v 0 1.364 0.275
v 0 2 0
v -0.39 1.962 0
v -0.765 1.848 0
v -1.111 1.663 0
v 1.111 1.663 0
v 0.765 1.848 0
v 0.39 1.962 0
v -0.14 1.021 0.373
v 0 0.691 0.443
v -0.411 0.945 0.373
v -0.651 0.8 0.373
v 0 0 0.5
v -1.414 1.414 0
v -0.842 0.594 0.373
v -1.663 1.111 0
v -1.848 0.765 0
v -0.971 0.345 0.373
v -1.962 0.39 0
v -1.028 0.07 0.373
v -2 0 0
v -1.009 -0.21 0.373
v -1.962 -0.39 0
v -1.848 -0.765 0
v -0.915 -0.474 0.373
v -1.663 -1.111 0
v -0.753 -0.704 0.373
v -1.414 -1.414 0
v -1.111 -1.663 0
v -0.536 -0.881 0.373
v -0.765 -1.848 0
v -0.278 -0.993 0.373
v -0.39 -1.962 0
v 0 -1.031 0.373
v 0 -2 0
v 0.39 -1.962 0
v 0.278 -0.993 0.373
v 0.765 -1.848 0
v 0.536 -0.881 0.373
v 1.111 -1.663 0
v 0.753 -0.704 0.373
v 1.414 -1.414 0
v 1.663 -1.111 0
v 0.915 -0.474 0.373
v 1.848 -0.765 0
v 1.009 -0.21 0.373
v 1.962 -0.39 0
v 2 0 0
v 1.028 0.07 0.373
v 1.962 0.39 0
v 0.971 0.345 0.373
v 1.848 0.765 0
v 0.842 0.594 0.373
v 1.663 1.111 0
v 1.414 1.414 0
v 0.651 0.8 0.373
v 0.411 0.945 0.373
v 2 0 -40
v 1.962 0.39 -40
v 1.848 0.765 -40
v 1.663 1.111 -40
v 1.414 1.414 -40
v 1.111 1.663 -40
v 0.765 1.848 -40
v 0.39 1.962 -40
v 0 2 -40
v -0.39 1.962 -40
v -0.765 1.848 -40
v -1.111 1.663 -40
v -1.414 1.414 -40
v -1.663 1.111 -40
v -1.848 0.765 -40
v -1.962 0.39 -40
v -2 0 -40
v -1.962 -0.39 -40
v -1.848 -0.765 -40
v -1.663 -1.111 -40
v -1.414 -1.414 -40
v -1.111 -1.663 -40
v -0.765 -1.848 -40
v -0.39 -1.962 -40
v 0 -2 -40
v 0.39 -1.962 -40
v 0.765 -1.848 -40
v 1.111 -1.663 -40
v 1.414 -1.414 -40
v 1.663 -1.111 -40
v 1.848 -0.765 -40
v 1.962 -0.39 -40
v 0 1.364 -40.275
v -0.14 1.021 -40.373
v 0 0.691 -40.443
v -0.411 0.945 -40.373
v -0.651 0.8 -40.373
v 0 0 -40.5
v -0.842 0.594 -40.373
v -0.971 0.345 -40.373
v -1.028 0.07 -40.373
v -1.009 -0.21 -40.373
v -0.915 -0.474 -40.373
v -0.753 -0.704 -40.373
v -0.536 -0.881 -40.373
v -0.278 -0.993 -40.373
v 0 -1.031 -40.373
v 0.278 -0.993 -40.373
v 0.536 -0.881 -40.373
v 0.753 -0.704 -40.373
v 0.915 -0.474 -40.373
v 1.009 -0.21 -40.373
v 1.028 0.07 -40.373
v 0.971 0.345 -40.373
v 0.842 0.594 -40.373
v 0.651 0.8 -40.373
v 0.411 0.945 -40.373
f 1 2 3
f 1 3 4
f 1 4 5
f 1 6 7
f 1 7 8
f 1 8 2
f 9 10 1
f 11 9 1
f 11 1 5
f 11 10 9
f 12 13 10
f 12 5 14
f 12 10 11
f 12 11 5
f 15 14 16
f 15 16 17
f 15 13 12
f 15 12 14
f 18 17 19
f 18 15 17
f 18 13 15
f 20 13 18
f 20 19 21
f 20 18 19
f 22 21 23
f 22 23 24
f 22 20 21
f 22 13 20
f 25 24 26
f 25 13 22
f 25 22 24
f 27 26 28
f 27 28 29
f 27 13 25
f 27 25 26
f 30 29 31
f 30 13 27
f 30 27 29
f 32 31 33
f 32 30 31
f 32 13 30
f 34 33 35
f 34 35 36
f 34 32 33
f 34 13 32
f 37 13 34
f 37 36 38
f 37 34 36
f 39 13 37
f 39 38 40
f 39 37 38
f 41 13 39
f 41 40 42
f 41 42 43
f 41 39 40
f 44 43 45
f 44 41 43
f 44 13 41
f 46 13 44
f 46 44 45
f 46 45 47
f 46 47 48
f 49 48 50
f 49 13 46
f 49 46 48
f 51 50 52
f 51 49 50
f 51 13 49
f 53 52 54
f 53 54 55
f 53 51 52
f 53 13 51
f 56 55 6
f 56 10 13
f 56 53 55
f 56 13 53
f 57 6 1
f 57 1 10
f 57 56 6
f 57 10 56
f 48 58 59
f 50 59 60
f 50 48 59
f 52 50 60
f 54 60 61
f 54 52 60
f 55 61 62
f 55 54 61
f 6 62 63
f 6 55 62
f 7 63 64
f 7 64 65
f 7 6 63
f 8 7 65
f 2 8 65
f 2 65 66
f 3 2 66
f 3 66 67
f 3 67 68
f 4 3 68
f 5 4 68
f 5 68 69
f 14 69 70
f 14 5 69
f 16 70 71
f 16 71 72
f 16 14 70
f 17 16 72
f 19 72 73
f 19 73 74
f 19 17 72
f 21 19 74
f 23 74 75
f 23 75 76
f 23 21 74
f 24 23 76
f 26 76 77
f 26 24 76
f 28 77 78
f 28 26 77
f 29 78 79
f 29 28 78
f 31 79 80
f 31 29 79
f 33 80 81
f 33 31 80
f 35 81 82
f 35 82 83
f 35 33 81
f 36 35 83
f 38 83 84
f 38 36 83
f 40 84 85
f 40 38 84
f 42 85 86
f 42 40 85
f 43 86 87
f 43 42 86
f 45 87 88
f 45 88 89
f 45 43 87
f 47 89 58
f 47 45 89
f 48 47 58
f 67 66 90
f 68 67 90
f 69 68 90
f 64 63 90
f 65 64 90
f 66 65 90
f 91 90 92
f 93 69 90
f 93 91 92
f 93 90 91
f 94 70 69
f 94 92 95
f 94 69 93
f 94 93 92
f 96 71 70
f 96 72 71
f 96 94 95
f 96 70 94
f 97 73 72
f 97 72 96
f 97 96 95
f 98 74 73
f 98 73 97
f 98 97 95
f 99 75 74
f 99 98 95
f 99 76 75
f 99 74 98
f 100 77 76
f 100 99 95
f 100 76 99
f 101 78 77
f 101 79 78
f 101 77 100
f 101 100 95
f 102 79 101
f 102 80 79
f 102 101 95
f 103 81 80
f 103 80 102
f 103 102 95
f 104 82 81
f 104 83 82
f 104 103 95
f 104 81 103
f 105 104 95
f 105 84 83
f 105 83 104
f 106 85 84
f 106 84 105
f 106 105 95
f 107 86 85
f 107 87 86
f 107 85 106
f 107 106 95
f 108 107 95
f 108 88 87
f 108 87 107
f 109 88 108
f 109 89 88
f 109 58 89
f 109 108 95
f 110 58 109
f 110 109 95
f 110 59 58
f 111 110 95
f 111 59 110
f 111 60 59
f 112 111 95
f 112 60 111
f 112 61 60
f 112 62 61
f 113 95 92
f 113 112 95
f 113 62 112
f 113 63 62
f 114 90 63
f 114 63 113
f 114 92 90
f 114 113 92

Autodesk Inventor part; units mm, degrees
ref_plane "YZ Plane" through (0, 0, 0) normal (1, 0, 0) x (0, 1, 0)
ref_plane "XZ Plane" through (0, 0, 0) normal (0, 1, 0) x (-1, 0, 0)
ref_plane "XY Plane" through (0, 0, 0) normal (0, 0, 1) x (1, 0, 0)
sketch "Sketch1" plane through (0, 0, 0) normal (0, 0, 1) x (1, 0, 0)
  circle A0 centre (0, 0) radius 2
  dimension "d0" = 4
extrude "Extrusion1" add sketch "Sketch1" against normal blind 40
sketch "Sketch3" plane through (0, 0, 0) normal (1, 0, 0) x (0, 1, 0)
  line L0 (0, 0) -> (0, 0.5)
  line L1 (2, 0) -> (-2, 0) projected
  arc A0 (2, 0) -> (0, 0.5) centre (0, -3.75) ccw
  line L2 (2, 0) -> (0, 0)
  dimension "d5" = 0.5
  dimension "d7" = 4.25
revolve "Revolution1" add sketch "Sketch3" angle 360 about axis through (0, 0, 0) along (0, 0, 1)
sketch "Sketch4" plane through (0, 0, 0) normal (1, 0, 0) x (0, 1, 0)
  line L0 (-2, -40) -> (2, -40) projected
  line L1 (0, -40) -> (0, -40.5)
  arc A0 (0, -40.5) -> (2, -40) centre (0, -36.25) ccw
  line L2 (2, -40) -> (0, -40)
  point P0 (0, 0)
  dimension "d9" = 0.5
  dimension "d11" = 4.25
revolve "Revolution2" add sketch "Sketch4" angle 360 about axis through (0, 0, -40) along (0, 0, -1)
properties part number "Poker hinge 3"
